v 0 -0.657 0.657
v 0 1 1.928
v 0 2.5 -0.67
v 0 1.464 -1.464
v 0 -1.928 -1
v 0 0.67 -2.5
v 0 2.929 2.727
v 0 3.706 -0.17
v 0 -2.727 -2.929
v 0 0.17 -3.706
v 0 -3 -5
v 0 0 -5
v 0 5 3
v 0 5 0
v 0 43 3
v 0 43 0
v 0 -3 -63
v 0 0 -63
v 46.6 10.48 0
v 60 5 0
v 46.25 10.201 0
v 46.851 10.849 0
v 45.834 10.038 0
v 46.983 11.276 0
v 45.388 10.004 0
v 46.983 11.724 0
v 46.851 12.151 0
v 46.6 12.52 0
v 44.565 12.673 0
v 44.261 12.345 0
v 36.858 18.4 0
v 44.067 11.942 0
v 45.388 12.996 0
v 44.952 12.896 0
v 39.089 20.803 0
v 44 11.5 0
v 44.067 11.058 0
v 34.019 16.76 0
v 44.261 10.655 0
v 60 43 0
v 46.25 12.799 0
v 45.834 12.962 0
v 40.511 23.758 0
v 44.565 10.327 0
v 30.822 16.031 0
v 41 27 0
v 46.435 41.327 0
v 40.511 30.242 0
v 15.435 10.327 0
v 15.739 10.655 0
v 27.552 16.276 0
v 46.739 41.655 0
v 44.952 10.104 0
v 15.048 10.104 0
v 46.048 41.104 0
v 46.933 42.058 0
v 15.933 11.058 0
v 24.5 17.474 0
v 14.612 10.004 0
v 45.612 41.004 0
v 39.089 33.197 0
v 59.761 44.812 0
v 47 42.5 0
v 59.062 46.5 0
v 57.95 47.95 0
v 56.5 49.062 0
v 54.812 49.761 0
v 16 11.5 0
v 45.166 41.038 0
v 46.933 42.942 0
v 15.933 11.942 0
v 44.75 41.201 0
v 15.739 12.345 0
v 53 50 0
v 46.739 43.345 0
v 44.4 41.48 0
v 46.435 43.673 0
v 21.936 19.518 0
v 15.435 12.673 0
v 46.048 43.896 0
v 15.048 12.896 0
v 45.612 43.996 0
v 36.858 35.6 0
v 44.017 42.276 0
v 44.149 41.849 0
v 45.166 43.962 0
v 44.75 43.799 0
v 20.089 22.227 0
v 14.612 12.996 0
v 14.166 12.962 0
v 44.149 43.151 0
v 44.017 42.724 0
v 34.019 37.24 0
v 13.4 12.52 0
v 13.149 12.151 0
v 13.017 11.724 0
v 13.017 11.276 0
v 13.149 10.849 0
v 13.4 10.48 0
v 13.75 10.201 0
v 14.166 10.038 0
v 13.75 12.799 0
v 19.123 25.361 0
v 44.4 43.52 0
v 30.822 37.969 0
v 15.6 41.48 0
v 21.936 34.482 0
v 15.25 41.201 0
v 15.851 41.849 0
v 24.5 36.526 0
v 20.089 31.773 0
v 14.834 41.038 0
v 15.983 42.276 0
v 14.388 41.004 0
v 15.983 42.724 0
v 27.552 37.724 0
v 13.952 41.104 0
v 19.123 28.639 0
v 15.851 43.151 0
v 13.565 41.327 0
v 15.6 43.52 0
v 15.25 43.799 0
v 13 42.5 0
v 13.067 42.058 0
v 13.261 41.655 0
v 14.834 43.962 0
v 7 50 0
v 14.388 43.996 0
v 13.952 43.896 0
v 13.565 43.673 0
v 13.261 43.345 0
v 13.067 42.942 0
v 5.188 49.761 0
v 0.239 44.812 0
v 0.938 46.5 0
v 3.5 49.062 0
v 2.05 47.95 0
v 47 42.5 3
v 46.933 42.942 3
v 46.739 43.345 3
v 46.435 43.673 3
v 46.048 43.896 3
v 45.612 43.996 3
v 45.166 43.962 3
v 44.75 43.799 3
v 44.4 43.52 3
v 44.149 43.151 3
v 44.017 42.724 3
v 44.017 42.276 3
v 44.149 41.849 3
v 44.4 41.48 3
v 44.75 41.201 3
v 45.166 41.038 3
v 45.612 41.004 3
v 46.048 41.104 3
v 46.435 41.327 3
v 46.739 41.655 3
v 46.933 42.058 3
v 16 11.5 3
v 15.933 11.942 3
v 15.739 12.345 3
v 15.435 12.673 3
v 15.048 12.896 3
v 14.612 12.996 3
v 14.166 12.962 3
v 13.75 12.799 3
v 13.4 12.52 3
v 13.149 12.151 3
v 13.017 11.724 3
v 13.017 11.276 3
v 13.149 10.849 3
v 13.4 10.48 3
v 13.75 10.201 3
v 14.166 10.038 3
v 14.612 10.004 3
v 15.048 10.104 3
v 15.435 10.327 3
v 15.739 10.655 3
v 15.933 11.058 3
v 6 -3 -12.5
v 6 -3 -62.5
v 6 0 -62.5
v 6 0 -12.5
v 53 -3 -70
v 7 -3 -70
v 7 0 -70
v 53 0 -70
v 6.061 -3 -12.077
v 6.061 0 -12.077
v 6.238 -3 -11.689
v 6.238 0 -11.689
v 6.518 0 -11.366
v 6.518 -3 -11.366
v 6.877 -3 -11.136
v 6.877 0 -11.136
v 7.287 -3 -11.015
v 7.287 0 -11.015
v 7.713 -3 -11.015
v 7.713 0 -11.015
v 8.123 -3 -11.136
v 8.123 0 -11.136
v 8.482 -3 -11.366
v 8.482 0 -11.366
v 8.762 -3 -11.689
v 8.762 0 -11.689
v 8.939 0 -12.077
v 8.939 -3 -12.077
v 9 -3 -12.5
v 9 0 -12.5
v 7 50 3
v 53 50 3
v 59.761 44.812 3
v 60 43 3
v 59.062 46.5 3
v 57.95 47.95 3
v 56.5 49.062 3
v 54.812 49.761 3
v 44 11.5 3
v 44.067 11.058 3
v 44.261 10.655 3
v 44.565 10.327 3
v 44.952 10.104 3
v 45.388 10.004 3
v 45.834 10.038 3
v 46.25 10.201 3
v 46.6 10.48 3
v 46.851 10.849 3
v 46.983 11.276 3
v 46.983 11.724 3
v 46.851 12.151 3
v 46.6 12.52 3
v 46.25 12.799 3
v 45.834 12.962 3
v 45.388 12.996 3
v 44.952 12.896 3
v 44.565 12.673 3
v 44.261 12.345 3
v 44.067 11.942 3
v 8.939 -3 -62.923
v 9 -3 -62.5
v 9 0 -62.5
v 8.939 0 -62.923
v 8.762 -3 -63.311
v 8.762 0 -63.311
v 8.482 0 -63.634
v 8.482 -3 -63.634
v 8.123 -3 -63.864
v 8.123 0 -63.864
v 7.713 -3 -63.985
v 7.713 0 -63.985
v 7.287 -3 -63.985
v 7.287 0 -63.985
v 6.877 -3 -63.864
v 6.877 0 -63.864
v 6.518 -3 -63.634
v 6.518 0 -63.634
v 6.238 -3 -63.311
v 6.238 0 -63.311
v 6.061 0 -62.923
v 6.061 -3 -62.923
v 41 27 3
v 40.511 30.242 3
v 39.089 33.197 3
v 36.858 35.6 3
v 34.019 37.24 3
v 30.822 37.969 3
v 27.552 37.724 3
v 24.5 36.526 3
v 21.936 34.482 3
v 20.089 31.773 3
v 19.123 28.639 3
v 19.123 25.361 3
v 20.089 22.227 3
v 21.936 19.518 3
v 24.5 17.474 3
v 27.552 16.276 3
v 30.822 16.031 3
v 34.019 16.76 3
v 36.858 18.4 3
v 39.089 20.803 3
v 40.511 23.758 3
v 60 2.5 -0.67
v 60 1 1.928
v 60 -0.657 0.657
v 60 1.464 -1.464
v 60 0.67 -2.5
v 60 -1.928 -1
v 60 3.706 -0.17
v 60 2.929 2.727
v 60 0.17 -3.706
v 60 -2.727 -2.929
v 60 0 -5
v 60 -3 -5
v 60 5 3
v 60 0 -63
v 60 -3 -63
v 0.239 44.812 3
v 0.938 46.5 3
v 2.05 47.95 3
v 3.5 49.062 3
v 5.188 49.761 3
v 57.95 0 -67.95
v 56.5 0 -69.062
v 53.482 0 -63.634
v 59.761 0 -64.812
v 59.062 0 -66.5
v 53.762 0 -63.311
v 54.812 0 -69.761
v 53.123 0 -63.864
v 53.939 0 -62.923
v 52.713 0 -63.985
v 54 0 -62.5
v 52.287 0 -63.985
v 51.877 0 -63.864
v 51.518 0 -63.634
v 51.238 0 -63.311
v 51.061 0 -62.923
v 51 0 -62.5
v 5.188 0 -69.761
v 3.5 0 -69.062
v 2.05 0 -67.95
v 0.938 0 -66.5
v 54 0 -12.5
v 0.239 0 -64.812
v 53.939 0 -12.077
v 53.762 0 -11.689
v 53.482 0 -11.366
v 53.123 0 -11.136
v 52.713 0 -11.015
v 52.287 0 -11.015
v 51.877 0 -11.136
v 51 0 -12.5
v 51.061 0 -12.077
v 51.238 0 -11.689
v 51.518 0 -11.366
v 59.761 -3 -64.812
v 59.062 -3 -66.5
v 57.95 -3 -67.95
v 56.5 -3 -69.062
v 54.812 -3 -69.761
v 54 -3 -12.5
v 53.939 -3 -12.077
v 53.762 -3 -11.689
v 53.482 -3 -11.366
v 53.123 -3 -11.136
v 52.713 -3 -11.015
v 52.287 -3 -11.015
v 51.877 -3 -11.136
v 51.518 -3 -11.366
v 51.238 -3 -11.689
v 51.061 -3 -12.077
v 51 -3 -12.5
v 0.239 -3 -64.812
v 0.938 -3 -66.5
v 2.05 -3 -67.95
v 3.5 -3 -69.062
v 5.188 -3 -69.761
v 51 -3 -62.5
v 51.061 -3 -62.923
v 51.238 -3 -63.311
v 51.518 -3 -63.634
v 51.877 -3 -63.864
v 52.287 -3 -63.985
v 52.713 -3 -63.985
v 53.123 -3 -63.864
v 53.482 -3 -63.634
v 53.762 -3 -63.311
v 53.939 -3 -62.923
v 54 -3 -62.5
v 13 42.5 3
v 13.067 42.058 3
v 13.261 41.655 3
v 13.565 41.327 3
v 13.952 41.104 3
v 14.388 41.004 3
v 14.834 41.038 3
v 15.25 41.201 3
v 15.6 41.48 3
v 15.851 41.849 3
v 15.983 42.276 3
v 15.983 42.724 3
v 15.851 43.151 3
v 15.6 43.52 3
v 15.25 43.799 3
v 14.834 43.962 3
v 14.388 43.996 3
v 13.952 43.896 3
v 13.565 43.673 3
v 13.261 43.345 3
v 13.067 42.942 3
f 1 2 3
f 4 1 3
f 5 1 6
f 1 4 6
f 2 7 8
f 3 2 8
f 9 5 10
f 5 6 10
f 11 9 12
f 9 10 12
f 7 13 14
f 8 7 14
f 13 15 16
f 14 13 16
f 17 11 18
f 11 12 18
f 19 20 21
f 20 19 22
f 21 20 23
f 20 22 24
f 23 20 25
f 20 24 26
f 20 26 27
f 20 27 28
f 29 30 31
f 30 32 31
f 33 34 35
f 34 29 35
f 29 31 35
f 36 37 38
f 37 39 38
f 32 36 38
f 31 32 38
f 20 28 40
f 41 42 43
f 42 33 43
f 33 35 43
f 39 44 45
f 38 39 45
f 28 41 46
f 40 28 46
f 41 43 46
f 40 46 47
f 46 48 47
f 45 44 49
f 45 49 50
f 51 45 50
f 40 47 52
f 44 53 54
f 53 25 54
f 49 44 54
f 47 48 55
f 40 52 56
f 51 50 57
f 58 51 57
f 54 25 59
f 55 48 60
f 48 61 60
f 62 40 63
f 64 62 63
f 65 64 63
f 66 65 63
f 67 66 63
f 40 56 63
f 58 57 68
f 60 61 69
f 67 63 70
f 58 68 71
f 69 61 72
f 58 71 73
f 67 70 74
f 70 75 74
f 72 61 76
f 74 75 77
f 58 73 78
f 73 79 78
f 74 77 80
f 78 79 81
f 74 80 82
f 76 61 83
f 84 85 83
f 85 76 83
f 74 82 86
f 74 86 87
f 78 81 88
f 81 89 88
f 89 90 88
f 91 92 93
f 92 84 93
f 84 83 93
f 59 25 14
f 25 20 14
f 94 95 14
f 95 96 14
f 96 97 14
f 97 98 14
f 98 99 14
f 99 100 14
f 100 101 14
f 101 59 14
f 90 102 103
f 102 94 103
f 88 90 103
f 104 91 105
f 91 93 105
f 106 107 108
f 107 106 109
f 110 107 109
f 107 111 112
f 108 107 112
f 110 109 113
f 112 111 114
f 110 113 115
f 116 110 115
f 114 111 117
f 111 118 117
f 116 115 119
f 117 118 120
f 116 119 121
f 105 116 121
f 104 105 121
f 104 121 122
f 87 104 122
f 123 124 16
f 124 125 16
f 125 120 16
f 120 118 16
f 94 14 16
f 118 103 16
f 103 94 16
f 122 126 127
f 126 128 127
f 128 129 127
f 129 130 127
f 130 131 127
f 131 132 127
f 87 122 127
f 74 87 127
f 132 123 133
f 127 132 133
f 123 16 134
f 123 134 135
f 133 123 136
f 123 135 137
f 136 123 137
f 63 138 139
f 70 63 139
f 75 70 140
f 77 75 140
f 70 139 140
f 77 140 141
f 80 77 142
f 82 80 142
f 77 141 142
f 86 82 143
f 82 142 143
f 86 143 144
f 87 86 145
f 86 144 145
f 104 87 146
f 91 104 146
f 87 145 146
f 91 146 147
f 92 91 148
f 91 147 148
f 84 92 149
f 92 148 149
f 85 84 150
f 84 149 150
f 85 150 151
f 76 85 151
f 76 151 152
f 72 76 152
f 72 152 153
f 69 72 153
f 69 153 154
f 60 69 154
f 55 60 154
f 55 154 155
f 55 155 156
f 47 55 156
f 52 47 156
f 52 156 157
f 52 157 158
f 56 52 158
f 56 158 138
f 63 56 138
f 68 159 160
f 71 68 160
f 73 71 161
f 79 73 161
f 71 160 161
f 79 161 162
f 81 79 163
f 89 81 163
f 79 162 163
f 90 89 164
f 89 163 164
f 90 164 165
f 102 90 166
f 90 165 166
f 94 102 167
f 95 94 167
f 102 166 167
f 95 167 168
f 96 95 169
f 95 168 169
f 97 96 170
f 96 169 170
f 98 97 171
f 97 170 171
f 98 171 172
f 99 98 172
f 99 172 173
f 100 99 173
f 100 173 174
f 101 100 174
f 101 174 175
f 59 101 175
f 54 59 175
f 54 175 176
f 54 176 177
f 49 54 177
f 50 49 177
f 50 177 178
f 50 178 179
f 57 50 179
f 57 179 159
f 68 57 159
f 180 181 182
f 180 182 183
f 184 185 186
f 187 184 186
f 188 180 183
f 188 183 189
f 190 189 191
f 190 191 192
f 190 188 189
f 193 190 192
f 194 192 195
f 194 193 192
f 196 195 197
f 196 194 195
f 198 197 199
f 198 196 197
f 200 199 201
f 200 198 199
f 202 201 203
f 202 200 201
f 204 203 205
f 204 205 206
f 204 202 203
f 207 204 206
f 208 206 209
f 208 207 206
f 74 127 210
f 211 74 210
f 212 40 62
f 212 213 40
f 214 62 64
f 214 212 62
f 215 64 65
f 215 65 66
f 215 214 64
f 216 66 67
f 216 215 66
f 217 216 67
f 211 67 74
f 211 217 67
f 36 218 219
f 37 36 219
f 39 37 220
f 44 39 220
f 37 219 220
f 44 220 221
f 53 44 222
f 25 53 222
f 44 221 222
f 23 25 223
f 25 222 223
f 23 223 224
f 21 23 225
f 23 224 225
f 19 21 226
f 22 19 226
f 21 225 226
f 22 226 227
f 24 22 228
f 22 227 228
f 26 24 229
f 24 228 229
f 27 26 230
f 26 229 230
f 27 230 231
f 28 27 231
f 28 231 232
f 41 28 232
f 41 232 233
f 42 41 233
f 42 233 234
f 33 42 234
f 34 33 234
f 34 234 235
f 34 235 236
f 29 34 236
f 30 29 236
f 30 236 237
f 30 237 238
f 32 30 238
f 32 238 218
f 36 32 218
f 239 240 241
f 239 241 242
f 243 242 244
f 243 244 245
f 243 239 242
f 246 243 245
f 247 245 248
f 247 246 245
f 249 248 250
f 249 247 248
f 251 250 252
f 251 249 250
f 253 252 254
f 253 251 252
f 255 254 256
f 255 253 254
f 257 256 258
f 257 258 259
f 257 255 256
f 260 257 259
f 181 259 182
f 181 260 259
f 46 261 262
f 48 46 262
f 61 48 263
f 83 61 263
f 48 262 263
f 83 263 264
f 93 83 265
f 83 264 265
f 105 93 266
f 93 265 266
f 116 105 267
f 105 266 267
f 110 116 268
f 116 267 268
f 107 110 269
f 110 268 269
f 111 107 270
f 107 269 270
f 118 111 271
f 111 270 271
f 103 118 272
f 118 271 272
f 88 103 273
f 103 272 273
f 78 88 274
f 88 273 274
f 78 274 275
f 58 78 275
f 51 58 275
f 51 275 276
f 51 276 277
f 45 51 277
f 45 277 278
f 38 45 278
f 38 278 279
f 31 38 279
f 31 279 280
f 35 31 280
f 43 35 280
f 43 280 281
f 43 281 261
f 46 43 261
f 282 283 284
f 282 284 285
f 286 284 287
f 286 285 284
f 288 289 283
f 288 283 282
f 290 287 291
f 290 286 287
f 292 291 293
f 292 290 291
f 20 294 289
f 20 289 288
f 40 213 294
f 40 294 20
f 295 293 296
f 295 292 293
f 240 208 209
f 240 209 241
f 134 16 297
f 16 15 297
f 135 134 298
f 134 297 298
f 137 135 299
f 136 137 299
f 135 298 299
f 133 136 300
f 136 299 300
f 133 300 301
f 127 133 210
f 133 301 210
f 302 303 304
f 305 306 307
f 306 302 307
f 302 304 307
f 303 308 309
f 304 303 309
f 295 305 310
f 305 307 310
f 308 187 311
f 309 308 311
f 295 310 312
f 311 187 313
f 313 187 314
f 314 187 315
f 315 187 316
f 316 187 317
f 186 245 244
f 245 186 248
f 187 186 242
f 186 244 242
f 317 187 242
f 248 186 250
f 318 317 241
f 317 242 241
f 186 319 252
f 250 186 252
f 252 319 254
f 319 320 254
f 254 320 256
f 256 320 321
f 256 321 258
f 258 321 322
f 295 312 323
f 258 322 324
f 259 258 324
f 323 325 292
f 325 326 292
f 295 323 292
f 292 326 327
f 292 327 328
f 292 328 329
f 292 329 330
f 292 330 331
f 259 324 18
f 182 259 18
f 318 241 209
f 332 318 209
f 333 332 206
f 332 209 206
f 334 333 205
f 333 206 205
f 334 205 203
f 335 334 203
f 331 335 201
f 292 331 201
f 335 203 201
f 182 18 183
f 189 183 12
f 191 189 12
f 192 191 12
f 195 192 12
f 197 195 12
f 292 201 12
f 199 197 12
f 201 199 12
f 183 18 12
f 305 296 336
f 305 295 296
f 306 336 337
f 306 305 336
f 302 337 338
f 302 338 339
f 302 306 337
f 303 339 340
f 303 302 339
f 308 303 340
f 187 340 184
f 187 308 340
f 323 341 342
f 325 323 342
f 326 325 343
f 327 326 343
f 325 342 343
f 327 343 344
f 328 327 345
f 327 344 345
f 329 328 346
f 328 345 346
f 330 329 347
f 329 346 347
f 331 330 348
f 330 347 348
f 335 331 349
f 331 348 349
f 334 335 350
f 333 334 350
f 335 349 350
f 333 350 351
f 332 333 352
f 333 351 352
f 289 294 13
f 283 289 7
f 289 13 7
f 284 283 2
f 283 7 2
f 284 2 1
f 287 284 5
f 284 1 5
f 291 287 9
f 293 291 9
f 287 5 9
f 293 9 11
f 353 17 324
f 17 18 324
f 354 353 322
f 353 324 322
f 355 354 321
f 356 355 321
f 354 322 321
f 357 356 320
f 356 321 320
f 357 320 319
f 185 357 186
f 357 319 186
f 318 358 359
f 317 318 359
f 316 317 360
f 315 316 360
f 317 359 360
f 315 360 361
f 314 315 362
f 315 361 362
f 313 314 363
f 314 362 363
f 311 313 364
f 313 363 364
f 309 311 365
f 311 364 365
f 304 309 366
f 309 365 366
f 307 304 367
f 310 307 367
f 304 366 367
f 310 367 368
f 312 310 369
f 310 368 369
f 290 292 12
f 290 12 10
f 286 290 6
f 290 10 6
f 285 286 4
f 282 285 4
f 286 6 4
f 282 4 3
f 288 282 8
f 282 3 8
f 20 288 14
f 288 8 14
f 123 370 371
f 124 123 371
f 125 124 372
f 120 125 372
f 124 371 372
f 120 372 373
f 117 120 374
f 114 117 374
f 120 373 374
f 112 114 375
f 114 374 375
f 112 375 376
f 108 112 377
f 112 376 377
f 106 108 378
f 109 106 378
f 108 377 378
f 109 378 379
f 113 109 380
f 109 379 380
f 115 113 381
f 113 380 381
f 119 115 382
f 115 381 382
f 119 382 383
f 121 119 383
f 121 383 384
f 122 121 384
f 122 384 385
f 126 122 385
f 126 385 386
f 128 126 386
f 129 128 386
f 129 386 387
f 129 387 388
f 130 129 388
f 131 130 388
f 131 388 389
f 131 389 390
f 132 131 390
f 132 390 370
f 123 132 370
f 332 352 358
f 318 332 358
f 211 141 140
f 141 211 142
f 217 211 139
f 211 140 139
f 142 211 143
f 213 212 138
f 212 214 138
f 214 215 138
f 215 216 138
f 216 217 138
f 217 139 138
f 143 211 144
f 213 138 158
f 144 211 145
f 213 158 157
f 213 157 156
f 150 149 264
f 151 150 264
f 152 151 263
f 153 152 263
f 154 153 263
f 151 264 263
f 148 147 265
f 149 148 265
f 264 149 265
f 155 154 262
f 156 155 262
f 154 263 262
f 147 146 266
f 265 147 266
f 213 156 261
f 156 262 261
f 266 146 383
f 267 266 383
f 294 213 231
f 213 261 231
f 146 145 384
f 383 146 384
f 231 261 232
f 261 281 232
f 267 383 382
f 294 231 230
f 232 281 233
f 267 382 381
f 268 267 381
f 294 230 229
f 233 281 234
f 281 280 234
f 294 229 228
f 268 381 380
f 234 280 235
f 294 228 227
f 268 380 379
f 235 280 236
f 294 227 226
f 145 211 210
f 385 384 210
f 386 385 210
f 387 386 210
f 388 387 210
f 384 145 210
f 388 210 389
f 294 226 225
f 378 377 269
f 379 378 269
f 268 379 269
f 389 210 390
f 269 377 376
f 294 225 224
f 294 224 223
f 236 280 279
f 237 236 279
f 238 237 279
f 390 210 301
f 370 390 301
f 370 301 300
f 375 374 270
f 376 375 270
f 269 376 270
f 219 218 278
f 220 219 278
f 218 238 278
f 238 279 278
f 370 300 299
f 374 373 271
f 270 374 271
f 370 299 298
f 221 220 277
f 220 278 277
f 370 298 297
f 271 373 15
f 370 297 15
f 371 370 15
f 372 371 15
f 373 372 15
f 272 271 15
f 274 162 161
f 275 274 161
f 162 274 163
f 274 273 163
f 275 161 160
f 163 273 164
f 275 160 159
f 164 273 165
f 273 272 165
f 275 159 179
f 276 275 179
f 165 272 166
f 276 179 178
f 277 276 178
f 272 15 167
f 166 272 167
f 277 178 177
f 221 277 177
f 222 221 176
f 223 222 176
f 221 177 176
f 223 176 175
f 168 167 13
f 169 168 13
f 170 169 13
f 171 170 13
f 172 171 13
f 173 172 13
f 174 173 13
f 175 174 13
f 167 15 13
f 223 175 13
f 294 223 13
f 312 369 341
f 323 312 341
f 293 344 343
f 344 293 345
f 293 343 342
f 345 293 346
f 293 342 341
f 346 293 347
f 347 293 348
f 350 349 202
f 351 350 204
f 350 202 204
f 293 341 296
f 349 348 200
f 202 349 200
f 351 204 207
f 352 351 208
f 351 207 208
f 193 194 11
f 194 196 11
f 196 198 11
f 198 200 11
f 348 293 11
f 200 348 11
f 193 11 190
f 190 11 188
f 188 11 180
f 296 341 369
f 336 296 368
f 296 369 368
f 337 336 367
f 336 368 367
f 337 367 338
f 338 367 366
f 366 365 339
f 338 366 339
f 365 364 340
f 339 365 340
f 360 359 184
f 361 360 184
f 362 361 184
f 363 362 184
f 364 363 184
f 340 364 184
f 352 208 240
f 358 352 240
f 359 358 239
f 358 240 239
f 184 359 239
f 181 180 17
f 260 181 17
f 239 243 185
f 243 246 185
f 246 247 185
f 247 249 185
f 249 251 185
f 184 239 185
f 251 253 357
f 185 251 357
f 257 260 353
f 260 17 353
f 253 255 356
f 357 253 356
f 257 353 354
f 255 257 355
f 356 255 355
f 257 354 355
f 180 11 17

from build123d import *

# Parameters (mm, degrees)
BASE_FLANGE1_DEPTH = 60
SKETCH6_R          = 11
SKETCH6_R_2        = 1.5
CUT_EXTRUDE1_DEPTH = 10
CUT_EXTRUDE2_DEPTH = 3
FILLET1_R          = 7


# Read off the part's stored shape, not the designer's step: Base-Flange1
with BuildPart() as part:
    # Base-Flange1 outline → Base-Flange1 (new body)
    with BuildSketch(Plane(origin=(0, 0, 0), x_dir=(0, 0, -1), z_dir=(1, 0, 0))):
        with BuildLine():
            Line((5, -3), (70, -3))
            Line((70, -3), (70, 0))
            Line((70, 0), (5, 0))
            ThreePointArc((5, 0), (1.464466094, 1.464466094), (0, 5))
            Line((0, 5), (0, 50))
            Line((0, 50), (-3, 50))
            Line((-3, 50), (-3, 5))
            ThreePointArc((-3, 5), (-0.656854249, -0.656854249), (5, -3))
        make_face()
    extrude(amount=BASE_FLANGE1_DEPTH)

    # Sketch6 → Cut-Extrude1 (cut)
    with BuildSketch(Plane.XY.offset(3)):
        with Locations((30, 27)):
            Circle(SKETCH6_R)
        with Locations((45.5, 42.5)):
            Circle(SKETCH6_R_2)
        with Locations(Location((14.5, 42.5, 0), (0, 0, 180))):
            Circle(SKETCH6_R_2)
        with Locations((14.5, 11.5)):
            Circle(SKETCH6_R_2)
        with Locations(Location((45.5, 11.5, 0), (0, 0, 180))):
            Circle(SKETCH6_R_2)
    extrude(amount=-CUT_EXTRUDE1_DEPTH, mode=Mode.SUBTRACT)

    # Sketch7 → Cut-Extrude2 (cut)
    with BuildSketch(Plane.XZ.offset(3)):
        with BuildLine():
            Line((6, -62.5), (6, -12.5))
            ThreePointArc((6, -12.5), (7.5, -11), (9, -12.5))
            Line((9, -12.5), (9, -62.5))
            ThreePointArc((9, -62.5), (7.5, -64), (6, -62.5))
        make_face()
        with BuildLine():
            Line((54, -62.5), (54, -12.5))
            ThreePointArc((54, -12.5), (52.5, -11), (51, -12.5))
            Line((51, -12.5), (51, -62.5))
            ThreePointArc((51, -62.5), (52.5, -64), (54, -62.5))
        make_face()
    extrude(amount=-CUT_EXTRUDE2_DEPTH, mode=Mode.SUBTRACT)

    # Fillet1
    fillet1_edges = [part.edges().sort_by_distance(p)[0] for p in [
        (60, 50, 1.5),
        (60, -1.5, -70),
        (0, 50, 1.5),
        (0, -1.5, -70),
    ]]
    fillet(fillet1_edges, radius=FILLET1_R)


solid = part.part
